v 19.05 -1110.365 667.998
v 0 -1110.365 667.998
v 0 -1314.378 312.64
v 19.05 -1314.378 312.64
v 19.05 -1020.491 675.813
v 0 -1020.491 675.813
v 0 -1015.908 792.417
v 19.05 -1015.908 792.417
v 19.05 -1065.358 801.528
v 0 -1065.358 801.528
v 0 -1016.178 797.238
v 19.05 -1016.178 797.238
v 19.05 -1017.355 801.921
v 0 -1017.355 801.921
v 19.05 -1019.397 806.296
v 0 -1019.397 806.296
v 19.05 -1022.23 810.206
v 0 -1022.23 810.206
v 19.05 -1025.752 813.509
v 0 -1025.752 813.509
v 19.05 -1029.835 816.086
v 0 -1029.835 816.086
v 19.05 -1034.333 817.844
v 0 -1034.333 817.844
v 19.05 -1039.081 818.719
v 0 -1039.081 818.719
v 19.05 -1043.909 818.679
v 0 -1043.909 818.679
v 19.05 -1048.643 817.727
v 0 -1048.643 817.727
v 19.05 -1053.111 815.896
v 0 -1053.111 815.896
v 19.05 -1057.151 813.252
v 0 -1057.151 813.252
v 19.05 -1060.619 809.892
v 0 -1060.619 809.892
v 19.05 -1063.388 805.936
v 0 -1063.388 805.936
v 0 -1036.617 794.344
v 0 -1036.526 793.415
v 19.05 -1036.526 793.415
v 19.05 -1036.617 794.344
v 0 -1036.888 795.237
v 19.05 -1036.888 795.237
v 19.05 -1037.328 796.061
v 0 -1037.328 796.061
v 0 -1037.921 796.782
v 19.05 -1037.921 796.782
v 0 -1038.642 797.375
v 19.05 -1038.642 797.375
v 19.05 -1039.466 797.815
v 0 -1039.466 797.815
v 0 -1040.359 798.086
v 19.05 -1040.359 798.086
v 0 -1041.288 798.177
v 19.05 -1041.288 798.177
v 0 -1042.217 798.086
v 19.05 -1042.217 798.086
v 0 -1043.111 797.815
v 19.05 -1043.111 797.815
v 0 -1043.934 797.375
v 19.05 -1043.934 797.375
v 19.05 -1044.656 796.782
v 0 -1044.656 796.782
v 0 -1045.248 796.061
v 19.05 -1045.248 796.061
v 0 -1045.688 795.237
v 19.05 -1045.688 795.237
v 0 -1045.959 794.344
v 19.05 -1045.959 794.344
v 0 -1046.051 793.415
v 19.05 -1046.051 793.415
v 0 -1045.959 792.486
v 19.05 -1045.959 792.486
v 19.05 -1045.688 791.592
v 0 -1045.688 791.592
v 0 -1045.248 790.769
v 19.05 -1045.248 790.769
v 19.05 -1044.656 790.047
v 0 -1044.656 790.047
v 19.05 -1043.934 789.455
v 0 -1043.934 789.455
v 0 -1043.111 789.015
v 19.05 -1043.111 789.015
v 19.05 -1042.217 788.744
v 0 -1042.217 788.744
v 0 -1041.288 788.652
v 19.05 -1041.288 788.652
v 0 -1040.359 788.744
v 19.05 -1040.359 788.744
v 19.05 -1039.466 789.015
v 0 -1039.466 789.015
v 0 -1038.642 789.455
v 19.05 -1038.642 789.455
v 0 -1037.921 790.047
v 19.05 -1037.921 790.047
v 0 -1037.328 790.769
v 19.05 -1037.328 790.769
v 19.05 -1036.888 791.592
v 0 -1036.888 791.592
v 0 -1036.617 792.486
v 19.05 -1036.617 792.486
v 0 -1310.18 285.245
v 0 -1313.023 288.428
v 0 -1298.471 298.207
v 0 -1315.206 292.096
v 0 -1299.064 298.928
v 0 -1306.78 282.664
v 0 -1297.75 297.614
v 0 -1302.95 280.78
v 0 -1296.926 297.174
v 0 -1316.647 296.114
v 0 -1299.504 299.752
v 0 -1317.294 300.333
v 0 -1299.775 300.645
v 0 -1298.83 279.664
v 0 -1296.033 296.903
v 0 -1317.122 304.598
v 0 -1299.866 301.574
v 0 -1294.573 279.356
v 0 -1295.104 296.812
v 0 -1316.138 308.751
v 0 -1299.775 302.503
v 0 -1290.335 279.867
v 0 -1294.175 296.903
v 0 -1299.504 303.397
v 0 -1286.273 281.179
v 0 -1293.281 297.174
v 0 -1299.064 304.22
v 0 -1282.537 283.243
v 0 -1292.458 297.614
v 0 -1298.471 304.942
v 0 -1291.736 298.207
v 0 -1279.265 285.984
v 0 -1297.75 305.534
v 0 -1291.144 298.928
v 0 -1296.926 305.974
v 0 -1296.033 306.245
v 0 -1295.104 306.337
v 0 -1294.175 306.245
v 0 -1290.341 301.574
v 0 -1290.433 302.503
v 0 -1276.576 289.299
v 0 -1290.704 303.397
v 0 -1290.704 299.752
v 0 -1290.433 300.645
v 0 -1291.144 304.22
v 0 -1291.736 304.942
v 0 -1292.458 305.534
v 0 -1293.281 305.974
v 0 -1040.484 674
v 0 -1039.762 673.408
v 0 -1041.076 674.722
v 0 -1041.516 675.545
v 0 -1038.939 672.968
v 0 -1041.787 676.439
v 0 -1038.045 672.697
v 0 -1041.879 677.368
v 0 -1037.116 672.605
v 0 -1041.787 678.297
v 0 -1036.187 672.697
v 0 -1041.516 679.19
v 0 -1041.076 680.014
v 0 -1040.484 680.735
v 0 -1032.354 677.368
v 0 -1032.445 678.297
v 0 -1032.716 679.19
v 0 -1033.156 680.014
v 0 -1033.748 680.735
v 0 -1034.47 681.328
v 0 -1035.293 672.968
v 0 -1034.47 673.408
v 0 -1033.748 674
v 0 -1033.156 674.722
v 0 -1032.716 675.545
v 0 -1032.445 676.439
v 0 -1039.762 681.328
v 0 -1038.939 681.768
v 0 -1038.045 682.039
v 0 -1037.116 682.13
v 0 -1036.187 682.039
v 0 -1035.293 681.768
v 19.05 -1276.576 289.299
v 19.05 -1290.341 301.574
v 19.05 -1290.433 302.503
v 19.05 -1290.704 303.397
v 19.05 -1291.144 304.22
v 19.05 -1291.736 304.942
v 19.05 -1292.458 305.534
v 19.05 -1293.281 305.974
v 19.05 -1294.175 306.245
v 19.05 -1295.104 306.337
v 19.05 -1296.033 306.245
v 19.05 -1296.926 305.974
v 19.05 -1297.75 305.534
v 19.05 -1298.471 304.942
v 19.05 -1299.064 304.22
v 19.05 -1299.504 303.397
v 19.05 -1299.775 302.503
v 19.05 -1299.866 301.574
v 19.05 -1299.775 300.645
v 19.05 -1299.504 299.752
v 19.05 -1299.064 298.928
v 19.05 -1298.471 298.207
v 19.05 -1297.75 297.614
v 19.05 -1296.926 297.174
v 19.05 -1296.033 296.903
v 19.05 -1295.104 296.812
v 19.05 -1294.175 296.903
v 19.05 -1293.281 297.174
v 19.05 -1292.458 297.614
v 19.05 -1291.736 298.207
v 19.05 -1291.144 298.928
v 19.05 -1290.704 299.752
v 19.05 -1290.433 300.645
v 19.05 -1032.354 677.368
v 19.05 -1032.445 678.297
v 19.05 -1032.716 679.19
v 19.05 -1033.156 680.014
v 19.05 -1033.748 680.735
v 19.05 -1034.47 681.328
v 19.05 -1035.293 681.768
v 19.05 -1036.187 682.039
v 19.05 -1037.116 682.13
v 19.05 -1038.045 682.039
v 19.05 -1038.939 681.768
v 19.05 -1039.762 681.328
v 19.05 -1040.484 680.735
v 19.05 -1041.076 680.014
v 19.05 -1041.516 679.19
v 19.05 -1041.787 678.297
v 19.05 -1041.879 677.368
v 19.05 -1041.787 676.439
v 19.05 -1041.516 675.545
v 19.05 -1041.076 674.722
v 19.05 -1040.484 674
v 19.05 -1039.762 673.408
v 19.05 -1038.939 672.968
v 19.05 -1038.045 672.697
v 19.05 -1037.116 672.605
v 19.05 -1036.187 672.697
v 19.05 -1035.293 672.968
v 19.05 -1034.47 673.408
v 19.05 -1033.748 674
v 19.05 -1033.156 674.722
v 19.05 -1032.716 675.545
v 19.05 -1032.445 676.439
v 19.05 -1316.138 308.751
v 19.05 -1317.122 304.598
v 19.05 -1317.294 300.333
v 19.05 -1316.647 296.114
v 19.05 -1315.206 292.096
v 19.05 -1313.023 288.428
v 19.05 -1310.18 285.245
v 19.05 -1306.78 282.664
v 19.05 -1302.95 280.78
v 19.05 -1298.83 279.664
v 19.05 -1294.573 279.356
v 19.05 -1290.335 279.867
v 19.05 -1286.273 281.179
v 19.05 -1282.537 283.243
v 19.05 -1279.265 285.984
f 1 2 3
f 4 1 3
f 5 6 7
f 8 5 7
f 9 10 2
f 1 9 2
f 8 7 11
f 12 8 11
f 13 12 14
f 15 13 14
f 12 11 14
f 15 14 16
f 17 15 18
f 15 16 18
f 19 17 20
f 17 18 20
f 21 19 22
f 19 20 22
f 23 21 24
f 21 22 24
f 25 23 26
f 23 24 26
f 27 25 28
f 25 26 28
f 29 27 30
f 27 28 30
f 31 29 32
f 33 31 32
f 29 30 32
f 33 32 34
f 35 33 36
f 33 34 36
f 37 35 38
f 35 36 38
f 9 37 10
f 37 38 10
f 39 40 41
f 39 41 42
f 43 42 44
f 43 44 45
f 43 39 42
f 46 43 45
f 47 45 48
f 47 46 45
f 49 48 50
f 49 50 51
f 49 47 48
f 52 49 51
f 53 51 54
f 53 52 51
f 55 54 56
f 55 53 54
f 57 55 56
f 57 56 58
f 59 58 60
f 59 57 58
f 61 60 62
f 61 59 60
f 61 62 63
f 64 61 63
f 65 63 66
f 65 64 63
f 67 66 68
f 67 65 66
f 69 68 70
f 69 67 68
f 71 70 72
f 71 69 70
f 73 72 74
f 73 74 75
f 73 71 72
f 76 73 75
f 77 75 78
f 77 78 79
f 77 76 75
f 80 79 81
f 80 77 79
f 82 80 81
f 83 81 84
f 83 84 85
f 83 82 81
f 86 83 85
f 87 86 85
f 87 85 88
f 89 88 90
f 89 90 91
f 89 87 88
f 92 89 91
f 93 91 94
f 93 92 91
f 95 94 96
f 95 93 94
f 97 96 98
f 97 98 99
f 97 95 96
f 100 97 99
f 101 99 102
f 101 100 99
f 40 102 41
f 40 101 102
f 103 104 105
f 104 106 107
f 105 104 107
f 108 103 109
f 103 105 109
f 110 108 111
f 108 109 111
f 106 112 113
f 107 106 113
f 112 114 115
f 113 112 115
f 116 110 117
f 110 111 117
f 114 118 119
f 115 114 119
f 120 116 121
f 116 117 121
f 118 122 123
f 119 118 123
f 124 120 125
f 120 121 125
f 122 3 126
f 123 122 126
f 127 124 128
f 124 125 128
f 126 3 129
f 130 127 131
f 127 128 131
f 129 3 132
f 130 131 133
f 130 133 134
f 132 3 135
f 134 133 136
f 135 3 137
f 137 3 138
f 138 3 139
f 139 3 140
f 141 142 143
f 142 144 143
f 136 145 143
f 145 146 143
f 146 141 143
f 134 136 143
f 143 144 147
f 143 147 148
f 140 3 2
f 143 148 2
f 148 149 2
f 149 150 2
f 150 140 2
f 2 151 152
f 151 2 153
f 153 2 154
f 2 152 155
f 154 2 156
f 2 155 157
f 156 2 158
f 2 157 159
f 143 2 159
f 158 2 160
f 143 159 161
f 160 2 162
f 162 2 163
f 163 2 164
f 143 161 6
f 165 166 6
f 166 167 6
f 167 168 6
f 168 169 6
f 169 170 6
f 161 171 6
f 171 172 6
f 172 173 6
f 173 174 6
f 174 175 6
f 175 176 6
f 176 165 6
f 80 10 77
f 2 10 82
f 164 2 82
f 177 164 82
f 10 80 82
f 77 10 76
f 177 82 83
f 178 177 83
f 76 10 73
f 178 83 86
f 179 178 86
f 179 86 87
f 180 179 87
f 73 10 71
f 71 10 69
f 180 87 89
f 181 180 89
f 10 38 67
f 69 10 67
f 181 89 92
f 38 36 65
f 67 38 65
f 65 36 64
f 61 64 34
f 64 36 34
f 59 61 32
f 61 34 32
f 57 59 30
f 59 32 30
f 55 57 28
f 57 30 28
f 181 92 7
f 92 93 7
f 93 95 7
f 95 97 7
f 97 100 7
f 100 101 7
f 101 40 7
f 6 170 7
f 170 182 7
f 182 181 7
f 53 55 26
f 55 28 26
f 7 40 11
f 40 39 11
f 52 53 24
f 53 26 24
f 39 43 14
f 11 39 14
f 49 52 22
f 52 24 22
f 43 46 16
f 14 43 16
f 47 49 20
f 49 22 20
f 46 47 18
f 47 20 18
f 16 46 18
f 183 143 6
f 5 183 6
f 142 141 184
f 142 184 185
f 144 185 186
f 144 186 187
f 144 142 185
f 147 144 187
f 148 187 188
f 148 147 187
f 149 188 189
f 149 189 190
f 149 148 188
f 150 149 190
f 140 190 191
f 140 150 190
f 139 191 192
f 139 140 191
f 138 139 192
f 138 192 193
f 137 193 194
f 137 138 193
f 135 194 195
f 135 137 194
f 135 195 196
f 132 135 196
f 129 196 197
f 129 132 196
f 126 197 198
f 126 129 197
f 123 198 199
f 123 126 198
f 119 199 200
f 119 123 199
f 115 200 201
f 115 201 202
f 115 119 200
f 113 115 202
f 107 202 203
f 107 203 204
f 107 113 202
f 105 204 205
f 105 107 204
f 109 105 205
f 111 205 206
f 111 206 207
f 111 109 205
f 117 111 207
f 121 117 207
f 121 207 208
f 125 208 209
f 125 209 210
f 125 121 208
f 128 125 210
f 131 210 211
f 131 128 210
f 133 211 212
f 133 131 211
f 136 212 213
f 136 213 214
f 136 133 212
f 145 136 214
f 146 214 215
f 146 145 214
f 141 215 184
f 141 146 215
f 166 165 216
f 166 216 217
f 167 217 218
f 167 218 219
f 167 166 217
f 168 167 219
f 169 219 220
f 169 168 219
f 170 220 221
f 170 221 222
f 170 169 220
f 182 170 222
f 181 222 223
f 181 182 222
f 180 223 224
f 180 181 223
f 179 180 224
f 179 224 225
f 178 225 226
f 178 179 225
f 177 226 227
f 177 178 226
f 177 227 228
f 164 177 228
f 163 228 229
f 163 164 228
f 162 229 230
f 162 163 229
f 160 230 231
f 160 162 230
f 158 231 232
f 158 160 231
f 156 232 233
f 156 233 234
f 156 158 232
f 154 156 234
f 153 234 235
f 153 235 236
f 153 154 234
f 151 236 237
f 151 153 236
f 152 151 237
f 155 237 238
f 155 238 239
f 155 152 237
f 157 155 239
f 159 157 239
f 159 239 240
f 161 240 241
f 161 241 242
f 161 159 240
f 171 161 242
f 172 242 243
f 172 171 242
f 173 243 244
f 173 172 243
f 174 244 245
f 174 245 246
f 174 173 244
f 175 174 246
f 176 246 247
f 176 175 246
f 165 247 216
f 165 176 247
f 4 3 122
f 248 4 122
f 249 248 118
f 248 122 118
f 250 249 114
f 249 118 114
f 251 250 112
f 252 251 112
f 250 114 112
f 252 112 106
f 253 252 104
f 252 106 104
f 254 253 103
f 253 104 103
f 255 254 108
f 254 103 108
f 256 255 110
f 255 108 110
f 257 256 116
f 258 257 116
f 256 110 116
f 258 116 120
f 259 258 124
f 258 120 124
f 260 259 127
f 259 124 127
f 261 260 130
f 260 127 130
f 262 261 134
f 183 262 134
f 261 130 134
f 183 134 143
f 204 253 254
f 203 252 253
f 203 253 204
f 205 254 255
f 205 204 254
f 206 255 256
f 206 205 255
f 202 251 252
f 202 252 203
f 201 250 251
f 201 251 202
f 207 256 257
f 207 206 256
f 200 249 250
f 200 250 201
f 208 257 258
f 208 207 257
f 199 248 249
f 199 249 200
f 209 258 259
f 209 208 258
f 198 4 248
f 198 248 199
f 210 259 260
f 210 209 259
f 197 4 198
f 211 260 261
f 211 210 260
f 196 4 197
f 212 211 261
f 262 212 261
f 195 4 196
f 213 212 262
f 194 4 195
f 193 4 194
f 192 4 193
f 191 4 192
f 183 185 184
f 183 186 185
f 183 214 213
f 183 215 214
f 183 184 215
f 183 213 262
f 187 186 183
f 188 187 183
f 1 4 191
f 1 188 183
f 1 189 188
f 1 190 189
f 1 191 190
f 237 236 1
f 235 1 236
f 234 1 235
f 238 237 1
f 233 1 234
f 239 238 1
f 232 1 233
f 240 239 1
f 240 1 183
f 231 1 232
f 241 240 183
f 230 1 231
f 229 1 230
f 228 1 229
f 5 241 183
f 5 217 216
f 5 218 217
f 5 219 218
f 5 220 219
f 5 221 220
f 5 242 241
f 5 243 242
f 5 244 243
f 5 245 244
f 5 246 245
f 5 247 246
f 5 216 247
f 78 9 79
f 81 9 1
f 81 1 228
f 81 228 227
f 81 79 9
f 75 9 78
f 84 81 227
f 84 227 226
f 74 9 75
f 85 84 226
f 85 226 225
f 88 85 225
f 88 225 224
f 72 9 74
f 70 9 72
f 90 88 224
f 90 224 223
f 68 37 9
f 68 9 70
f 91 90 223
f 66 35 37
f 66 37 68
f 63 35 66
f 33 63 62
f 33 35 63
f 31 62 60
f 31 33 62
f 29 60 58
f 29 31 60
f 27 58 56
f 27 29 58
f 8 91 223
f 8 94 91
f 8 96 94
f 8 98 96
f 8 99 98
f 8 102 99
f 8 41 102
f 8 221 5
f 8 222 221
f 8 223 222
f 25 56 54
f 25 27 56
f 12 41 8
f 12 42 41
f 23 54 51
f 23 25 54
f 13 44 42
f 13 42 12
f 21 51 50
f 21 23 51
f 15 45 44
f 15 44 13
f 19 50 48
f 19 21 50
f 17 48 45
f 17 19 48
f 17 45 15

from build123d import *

# Parameters (mm, degrees)
F2_R     = 4.7625
F3_DEPTH = 19.05


with BuildPart() as f3:
    # F2 (on Right) → F3 (new body)
    with BuildSketch(Plane.YZ):
        with BuildLine():
            ThreePointArc((-1015.907792, 792.417112), (-1036.686006, 818.394405), (-1065.357711, 801.527653))
            Line((-1065.357711, 801.527653), (-1110.364914, 667.998314))
            Line((-1110.364914, 667.998314), (-1314.37809, 312.639923))
            ThreePointArc((-1314.37809, 312.639923), (-1306.780078, 282.66374), (-1276.576197, 289.299018))
            Line((-1276.576197, 289.299018), (-1020.491481, 675.813437))
            Line((-1020.491481, 675.813437), (-1015.907792, 792.417112))
        make_face()
        with Locations((-1295.10365, 301.574363)):
            Circle(F2_R, mode=Mode.SUBTRACT)
        with Locations((-1037.116024, 677.367714)):
            Circle(F2_R, mode=Mode.SUBTRACT)
        with Locations((-1041.288189, 793.414815)):
            Circle(F2_R, mode=Mode.SUBTRACT)
    extrude(amount=F3_DEPTH)


solid = f3.part
